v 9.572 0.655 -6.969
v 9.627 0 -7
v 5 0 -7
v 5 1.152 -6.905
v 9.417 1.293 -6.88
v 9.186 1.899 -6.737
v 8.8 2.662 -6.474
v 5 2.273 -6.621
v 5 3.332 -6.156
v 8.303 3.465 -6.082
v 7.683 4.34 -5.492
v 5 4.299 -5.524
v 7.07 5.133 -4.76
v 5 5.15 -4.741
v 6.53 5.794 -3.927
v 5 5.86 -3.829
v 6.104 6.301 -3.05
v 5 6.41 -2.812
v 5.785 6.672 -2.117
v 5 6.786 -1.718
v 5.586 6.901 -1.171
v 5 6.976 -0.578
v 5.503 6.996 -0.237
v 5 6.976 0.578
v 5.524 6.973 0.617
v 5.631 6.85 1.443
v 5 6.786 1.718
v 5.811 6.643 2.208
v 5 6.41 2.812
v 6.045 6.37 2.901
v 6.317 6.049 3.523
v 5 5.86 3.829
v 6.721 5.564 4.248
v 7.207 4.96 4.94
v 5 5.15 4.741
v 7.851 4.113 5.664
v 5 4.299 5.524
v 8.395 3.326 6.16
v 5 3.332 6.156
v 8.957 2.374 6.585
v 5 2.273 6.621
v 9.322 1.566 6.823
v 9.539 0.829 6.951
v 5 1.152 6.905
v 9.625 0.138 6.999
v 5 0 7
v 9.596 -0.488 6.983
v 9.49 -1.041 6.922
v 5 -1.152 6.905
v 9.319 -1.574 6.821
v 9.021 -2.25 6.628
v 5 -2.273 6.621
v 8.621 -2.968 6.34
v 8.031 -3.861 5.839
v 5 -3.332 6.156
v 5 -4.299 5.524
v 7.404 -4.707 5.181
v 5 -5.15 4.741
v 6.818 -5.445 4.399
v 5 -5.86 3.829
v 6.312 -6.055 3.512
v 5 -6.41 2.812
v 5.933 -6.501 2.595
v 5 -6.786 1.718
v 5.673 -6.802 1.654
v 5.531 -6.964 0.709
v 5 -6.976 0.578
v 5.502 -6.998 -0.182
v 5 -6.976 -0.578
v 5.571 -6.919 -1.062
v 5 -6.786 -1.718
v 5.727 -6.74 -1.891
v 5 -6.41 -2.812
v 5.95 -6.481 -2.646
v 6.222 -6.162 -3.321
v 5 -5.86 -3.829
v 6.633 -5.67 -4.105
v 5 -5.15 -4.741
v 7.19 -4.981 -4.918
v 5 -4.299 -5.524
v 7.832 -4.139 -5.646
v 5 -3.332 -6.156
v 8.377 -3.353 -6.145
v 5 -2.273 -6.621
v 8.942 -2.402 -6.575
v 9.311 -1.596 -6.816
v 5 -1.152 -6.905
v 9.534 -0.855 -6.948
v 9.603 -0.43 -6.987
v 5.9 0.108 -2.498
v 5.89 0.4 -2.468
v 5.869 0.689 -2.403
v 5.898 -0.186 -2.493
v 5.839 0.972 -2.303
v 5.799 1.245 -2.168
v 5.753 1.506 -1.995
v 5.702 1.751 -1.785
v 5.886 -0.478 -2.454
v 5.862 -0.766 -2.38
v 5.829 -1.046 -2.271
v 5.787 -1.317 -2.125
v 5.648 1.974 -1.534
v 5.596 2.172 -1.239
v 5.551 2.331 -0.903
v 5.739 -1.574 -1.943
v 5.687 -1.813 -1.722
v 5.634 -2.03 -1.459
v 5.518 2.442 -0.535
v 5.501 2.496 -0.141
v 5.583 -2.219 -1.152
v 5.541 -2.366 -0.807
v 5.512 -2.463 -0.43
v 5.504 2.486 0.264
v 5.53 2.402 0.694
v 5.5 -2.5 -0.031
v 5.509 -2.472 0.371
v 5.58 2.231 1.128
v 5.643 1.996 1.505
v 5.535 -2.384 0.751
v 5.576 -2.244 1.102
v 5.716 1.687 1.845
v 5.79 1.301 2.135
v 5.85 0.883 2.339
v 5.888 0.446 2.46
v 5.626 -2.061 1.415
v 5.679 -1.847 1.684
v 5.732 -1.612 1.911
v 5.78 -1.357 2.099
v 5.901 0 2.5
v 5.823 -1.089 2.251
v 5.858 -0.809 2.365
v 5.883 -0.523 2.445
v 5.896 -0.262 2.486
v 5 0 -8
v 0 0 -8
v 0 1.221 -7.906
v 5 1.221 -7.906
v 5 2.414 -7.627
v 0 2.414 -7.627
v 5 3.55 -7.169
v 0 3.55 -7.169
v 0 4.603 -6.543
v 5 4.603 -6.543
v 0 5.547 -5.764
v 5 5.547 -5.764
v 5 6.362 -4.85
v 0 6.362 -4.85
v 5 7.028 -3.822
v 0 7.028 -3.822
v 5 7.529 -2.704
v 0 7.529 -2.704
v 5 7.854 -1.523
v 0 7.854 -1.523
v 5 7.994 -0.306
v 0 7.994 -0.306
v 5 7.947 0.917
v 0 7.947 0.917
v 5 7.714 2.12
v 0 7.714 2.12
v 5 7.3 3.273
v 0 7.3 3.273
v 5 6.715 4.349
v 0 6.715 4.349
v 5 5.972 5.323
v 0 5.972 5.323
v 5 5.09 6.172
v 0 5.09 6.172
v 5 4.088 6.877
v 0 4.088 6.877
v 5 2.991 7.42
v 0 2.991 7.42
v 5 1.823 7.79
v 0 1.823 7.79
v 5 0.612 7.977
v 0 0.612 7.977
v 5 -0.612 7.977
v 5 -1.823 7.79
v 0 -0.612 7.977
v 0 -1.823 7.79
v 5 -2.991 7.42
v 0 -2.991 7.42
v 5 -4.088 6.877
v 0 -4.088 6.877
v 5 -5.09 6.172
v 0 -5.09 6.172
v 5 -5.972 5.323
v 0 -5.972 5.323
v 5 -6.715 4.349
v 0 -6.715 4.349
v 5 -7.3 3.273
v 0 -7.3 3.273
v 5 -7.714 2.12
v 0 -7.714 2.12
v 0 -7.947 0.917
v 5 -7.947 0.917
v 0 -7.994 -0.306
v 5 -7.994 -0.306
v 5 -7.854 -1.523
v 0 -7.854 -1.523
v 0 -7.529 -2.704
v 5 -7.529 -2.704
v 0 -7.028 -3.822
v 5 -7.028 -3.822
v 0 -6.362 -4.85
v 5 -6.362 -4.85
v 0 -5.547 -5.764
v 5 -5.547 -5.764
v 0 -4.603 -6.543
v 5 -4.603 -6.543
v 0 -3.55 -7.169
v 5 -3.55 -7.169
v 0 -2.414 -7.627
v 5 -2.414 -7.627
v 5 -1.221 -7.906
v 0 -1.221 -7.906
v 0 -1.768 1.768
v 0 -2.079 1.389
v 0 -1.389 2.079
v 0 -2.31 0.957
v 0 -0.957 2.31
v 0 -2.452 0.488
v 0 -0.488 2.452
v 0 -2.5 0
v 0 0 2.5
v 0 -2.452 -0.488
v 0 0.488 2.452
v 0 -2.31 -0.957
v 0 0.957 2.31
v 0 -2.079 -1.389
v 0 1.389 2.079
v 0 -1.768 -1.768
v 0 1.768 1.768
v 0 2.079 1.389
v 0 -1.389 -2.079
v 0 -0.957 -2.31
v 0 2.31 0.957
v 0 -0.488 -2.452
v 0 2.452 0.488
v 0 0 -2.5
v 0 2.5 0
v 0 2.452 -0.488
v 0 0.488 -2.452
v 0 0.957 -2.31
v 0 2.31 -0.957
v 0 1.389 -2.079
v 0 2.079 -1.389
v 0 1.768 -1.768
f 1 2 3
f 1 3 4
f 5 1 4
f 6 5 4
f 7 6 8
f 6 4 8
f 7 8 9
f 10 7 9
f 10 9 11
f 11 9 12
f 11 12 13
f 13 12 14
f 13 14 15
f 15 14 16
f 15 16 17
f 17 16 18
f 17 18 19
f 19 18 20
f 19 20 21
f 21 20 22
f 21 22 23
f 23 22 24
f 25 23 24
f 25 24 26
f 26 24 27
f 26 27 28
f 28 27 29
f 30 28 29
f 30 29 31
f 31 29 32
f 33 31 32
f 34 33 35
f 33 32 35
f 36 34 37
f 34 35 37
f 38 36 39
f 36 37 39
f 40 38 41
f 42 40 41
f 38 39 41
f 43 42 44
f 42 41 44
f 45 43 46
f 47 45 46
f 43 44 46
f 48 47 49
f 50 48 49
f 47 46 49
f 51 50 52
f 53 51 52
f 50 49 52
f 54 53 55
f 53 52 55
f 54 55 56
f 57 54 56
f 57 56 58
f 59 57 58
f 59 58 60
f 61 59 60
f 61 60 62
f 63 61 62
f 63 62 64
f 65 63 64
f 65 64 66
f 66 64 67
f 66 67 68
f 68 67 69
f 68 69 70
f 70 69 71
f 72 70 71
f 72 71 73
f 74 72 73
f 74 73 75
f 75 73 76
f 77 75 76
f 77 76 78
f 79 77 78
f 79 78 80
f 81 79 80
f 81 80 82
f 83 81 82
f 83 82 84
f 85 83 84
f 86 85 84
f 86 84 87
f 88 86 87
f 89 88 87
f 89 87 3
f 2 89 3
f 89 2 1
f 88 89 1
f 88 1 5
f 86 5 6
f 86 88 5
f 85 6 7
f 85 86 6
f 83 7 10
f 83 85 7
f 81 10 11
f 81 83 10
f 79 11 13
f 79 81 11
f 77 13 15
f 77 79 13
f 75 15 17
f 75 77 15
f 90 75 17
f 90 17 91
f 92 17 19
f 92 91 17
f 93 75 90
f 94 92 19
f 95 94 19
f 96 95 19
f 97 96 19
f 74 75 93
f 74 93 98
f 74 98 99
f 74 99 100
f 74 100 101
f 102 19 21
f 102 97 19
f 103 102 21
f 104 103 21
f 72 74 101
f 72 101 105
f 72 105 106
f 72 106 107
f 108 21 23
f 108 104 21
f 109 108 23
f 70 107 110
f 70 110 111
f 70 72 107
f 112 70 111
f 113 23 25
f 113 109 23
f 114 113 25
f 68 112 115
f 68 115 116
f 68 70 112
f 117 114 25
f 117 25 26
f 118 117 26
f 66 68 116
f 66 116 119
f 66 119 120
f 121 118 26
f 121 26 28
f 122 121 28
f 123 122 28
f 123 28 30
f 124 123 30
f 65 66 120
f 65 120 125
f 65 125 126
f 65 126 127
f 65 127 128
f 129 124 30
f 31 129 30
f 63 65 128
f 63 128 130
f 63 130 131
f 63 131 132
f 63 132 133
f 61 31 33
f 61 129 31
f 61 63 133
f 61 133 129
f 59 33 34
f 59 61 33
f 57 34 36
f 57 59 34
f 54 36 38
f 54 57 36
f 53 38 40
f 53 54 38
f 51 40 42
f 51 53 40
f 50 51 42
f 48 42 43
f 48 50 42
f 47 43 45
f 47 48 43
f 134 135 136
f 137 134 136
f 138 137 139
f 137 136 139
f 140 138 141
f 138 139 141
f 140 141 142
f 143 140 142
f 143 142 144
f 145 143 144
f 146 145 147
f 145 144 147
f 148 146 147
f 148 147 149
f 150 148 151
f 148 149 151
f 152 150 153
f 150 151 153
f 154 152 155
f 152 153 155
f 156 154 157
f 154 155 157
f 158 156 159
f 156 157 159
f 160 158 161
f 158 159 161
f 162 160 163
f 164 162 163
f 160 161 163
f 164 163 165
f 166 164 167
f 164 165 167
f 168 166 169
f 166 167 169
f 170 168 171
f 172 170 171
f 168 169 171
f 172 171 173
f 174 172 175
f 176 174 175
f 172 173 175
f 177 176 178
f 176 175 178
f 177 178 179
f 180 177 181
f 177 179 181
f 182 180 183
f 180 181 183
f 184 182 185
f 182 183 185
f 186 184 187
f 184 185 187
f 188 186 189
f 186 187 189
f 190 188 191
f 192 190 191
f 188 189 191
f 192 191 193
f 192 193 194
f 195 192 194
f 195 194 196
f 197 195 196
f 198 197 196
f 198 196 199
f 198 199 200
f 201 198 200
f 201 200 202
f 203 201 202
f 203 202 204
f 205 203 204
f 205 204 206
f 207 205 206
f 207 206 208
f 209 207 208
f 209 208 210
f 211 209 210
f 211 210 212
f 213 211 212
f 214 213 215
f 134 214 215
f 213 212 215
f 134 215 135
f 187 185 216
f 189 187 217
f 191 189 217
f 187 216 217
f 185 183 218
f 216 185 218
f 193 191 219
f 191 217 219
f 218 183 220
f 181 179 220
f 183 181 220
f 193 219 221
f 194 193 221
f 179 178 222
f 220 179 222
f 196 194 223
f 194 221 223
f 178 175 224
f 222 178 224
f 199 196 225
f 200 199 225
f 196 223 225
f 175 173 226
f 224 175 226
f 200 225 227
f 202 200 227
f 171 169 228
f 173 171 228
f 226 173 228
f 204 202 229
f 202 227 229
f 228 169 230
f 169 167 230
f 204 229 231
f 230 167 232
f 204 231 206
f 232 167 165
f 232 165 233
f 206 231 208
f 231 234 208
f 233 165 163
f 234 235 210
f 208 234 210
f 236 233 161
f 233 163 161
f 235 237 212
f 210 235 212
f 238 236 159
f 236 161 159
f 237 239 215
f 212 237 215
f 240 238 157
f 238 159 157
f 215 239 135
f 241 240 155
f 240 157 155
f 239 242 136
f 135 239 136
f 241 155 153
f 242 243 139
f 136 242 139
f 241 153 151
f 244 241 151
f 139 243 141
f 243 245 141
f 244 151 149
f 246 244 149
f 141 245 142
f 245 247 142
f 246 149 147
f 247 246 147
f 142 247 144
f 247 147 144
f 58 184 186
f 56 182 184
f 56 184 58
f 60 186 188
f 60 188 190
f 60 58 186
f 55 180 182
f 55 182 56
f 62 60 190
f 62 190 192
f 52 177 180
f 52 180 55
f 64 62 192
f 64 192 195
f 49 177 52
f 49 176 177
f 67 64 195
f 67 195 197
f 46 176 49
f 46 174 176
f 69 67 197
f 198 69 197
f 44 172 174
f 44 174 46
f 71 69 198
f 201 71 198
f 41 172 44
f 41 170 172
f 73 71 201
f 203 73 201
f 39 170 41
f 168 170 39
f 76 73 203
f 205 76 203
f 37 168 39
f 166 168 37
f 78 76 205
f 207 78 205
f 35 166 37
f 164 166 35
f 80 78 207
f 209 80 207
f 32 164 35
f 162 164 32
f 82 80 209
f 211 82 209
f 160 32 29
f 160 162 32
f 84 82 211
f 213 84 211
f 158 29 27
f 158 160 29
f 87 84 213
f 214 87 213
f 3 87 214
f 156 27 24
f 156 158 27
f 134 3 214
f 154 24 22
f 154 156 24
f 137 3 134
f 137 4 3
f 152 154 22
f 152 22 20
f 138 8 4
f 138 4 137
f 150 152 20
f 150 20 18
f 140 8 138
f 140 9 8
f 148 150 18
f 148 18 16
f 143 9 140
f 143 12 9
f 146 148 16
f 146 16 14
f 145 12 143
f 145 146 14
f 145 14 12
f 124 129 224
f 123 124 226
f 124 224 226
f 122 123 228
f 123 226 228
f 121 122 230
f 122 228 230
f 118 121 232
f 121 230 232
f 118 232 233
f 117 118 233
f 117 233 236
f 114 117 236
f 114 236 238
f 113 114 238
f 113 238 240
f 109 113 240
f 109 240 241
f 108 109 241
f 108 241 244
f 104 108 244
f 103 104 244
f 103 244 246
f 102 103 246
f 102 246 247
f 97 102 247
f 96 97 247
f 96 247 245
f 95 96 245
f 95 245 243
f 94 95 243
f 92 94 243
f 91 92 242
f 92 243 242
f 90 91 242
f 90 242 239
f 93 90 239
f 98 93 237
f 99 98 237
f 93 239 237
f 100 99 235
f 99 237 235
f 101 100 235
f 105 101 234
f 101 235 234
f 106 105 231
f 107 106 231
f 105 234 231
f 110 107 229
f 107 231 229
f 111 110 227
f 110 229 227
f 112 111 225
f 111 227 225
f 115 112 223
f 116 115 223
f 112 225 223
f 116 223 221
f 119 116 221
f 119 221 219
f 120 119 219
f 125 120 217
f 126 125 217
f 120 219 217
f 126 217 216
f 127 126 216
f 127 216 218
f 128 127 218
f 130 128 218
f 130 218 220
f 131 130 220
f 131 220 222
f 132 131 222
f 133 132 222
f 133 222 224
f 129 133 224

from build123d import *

# Parameters (mm, degrees)
SKETCH1_R               = 8
BOSS_EXTRUDE1_DEPTH     = 5
SKETCH2_R               = 7
BOSS_EXTRUDE2_DEPTH     = 5
CUT_EXTRUDE1_DEPTH      = 16.099668871
CUT_EXTRUDE1_DEPTH_BACK = 15
SKETCH3_R               = 8
SKETCH4_R               = 2.5
CUT_EXTRUDE2_DEPTH      = 15


with BuildPart() as part:
    # Sketch1 → Boss-Extrude1 (new body)
    with BuildSketch(Plane(origin=(0, 0, 0), x_dir=(0, 0, -1), z_dir=(1, 0, 0))):
        Circle(SKETCH1_R)
    extrude(amount=BOSS_EXTRUDE1_DEPTH)

    # Sketch2 → Boss-Extrude2 (add)
    with BuildSketch(Plane(origin=(5, 0, 0), x_dir=(0, 0, -1), z_dir=(1, 0, 0))):
        Circle(SKETCH2_R)
    extrude(amount=BOSS_EXTRUDE2_DEPTH)

    # Sketch3 → Cut-Extrude1 (cut, two sides: drawn at the far end of the back side and taken through both)
    with BuildSketch(Plane(origin=(0, 0, 0), x_dir=(1, 0, 0), z_dir=(0, 1, 0)).offset(-CUT_EXTRUDE1_DEPTH_BACK)):
        with Locations((13.5, 0)):
            Circle(SKETCH3_R)
    extrude(amount=CUT_EXTRUDE1_DEPTH + CUT_EXTRUDE1_DEPTH_BACK, mode=Mode.SUBTRACT)

    # Sketch4 → Cut-Extrude2 (cut)
    with BuildSketch(Plane.ZY):
        Circle(SKETCH4_R)
    extrude(amount=-CUT_EXTRUDE2_DEPTH, mode=Mode.SUBTRACT)


solid = part.part
